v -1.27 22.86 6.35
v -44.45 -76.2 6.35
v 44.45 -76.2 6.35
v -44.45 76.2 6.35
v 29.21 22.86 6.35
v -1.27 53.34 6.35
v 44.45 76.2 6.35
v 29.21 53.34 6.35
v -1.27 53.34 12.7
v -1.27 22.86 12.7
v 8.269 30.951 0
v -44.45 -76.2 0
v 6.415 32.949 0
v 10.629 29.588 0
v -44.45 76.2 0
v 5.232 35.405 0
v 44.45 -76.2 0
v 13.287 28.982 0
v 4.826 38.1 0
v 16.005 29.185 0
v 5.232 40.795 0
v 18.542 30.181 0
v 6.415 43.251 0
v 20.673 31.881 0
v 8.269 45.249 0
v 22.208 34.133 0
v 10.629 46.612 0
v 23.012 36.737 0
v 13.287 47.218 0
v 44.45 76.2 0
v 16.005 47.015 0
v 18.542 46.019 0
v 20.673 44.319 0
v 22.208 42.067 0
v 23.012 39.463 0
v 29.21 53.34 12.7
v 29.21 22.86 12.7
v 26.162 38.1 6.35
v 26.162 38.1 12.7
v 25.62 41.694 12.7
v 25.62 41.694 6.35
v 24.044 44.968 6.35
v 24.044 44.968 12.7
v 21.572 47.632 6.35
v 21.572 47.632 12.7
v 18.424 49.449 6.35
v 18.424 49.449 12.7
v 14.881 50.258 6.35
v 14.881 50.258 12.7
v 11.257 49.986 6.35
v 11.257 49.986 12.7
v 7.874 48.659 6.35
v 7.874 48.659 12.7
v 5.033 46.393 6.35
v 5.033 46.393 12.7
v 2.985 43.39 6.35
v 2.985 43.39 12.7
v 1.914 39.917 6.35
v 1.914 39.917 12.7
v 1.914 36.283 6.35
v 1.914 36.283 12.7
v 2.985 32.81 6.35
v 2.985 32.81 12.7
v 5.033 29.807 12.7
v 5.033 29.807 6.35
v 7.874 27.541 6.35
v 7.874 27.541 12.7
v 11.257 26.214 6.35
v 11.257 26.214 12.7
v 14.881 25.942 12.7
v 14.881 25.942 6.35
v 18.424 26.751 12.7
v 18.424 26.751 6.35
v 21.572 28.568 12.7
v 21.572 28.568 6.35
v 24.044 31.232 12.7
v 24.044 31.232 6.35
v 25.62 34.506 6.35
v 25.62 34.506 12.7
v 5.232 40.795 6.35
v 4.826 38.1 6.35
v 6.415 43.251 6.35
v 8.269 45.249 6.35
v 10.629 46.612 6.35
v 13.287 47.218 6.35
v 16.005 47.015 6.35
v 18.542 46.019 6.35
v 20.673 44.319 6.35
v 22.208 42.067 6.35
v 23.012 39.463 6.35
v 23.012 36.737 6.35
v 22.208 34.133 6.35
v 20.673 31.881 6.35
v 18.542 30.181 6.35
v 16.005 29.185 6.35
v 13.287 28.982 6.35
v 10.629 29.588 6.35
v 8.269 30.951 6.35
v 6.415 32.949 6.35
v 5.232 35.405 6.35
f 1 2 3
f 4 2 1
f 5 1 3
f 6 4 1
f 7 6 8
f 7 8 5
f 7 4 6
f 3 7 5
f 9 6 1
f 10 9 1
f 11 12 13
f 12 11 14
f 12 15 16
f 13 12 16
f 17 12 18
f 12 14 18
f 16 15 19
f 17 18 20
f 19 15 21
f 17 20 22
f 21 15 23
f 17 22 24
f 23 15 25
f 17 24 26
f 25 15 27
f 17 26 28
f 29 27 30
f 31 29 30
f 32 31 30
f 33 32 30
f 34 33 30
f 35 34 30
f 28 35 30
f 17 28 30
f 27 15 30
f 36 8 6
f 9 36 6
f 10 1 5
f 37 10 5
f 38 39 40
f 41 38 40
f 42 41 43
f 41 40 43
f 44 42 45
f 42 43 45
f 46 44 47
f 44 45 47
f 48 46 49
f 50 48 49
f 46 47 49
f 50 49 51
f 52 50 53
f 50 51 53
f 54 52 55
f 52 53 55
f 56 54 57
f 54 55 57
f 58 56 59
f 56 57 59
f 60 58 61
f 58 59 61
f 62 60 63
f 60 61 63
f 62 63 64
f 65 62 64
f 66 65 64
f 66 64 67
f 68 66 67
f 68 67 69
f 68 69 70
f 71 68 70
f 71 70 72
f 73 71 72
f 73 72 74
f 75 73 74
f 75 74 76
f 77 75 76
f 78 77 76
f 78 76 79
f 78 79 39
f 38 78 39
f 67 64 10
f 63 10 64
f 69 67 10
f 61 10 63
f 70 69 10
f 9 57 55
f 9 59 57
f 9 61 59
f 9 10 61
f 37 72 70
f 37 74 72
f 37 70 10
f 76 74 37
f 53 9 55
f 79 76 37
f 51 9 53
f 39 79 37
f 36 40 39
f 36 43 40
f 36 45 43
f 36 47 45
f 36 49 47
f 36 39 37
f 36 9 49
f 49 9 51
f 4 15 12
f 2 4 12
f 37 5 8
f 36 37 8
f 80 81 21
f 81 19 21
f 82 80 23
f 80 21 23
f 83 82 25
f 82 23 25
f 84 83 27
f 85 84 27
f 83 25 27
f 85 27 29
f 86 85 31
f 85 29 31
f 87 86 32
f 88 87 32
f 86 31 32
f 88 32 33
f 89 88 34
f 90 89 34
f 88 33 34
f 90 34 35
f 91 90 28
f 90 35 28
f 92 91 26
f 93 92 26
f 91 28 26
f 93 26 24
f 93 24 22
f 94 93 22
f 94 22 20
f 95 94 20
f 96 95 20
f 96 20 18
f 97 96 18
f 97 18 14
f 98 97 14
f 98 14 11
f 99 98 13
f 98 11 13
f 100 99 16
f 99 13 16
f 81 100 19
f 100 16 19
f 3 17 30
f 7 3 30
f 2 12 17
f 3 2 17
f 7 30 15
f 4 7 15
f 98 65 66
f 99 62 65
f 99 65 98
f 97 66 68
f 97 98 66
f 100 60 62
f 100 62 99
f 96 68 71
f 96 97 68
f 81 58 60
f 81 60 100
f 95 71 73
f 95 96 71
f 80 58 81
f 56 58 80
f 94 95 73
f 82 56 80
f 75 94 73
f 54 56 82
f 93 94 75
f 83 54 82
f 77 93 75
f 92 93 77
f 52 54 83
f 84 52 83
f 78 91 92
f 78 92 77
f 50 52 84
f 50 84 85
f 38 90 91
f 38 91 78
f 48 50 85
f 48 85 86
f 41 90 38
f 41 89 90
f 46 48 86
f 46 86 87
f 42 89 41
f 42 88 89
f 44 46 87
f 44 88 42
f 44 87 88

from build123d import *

# Parameters (mm, degrees)
F1_DEPTH       = 6.35
F0_W           = 15.24
F0_H           = 15.24
F2_DEPTH       = 12.7
F4_D           = 18.288
F4_CBORE_D     = 24.384
F4_CBORE_DEPTH = 6.35


with BuildPart() as f1:
    # F0 (on Top) → F1 (new body)
    with BuildSketch(Plane.XY):
        Polygon((-44.45, -76.2), (44.45, -76.2), (44.45, 38.1), (29.21, 38.1), (29.21, 22.86), (-1.27, 22.86), (-1.27, 53.34), (13.97, 53.34), (13.97, 76.2), (-44.45, 76.2), align=None)
        Polygon((29.21, 38.1), (44.45, 38.1), (44.45, 76.2), (13.97, 76.2), (13.97, 53.34), (29.21, 53.34), align=None)
    extrude(amount=F1_DEPTH)

    # F0 (on Top) → F2 (join)
    with BuildSketch(Plane.XY):
        Polygon((29.21, 22.86), (29.21, 38.1), (13.97, 38.1), (13.97, 53.34), (-1.27, 53.34), (-1.27, 22.86), align=None)
        with Locations((21.59, 45.72)):
            Rectangle(F0_W, F0_H)
    extrude(amount=F2_DEPTH)

    # F4 (through all)
    with Locations(Plane.XY.offset(12.7)):
        with Locations((13.97, 38.1)):
            CounterBoreHole(F4_D / 2, F4_CBORE_D / 2, F4_CBORE_DEPTH)


solid = f1.part
